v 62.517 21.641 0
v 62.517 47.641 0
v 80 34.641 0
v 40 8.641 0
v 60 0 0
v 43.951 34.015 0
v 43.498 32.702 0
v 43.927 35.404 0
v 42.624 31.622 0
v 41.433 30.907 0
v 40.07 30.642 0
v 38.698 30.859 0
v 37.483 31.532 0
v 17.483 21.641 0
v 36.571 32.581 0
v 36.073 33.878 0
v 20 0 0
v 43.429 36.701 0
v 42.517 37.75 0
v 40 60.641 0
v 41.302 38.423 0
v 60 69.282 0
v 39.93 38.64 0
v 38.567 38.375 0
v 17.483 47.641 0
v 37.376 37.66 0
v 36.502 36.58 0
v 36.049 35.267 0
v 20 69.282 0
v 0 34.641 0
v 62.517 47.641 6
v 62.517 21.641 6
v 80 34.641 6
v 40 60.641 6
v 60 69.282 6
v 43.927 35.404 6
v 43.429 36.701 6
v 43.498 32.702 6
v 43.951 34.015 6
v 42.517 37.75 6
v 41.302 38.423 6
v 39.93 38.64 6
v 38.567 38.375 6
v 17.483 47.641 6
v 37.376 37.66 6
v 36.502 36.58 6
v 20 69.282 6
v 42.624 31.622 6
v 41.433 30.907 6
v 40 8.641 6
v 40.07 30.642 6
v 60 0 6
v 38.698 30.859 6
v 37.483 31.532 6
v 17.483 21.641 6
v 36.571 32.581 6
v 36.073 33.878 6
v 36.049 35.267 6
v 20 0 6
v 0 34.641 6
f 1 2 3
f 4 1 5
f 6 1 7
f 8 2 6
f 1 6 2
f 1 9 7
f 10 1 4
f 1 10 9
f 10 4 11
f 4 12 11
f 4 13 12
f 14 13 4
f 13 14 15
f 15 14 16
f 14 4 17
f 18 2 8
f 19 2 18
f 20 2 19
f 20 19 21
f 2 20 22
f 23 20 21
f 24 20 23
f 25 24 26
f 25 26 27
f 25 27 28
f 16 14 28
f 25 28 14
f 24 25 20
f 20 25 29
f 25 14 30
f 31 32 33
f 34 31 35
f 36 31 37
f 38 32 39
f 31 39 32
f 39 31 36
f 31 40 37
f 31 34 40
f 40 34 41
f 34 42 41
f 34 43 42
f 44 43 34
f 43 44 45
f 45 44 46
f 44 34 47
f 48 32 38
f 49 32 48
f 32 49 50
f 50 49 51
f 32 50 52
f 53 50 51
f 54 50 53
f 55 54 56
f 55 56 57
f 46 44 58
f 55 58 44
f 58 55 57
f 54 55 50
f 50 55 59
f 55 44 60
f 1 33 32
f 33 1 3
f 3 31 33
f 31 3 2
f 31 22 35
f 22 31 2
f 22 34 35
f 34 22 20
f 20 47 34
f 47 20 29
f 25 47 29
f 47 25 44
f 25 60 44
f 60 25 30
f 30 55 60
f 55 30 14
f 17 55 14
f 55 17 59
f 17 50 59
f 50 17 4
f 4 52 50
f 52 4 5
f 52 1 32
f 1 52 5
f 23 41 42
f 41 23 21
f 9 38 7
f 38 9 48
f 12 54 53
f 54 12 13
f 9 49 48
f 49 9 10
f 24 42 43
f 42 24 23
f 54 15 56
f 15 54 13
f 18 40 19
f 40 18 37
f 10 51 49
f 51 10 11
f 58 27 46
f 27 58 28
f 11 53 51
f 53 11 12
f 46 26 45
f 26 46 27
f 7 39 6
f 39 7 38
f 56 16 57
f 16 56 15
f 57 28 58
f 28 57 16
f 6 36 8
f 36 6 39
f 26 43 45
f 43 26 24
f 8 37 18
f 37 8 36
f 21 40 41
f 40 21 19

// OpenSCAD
$fn = 32;

// ----------------------------------------------------------------------
// Star wheel: 6-point blunt, R40
// ----------------------------------------------------------------------

// --- parameters (mm) ---
n_points = 6;             // number of points / teeth
r_out = 40;               // tip radius
r_in = 26;                // root radius
bore_r = 4;               // centre bore radius
plate_t = 6;              // plate thickness, Z (extrusion height)
bore_d = 8;               // centre bore diameter

profile = [[80, 34.641], [62.517, 47.641], [60, 69.282], [40, 60.641], [20, 69.282], [17.483, 47.641], [0, 34.641], [17.483, 21.641], [20, 0], [40, 8.641], [60, 0], [62.517, 21.641]];  // primary outline, 12 points, counter clockwise
void_1 = [[43.927, 35.404], [43.429, 36.701], [42.517, 37.75], [41.302, 38.423], [39.93, 38.64], [38.567, 38.375], [37.376, 37.66], [36.502, 36.58], [36.049, 35.267], [36.073, 33.878], [36.571, 32.581], [37.483, 31.532], [38.698, 30.859], [40.07, 30.642], [41.433, 30.907], [42.624, 31.622], [43.498, 32.702], [43.951, 34.015]];  // centre bore, 18 points

// --- the one profile operation ---
difference() {
  linear_extrude(height = plate_t) polygon(points = profile);
  translate([0, 0, -1])
    linear_extrude(height = plate_t + 2) polygon(points = void_1);
}
